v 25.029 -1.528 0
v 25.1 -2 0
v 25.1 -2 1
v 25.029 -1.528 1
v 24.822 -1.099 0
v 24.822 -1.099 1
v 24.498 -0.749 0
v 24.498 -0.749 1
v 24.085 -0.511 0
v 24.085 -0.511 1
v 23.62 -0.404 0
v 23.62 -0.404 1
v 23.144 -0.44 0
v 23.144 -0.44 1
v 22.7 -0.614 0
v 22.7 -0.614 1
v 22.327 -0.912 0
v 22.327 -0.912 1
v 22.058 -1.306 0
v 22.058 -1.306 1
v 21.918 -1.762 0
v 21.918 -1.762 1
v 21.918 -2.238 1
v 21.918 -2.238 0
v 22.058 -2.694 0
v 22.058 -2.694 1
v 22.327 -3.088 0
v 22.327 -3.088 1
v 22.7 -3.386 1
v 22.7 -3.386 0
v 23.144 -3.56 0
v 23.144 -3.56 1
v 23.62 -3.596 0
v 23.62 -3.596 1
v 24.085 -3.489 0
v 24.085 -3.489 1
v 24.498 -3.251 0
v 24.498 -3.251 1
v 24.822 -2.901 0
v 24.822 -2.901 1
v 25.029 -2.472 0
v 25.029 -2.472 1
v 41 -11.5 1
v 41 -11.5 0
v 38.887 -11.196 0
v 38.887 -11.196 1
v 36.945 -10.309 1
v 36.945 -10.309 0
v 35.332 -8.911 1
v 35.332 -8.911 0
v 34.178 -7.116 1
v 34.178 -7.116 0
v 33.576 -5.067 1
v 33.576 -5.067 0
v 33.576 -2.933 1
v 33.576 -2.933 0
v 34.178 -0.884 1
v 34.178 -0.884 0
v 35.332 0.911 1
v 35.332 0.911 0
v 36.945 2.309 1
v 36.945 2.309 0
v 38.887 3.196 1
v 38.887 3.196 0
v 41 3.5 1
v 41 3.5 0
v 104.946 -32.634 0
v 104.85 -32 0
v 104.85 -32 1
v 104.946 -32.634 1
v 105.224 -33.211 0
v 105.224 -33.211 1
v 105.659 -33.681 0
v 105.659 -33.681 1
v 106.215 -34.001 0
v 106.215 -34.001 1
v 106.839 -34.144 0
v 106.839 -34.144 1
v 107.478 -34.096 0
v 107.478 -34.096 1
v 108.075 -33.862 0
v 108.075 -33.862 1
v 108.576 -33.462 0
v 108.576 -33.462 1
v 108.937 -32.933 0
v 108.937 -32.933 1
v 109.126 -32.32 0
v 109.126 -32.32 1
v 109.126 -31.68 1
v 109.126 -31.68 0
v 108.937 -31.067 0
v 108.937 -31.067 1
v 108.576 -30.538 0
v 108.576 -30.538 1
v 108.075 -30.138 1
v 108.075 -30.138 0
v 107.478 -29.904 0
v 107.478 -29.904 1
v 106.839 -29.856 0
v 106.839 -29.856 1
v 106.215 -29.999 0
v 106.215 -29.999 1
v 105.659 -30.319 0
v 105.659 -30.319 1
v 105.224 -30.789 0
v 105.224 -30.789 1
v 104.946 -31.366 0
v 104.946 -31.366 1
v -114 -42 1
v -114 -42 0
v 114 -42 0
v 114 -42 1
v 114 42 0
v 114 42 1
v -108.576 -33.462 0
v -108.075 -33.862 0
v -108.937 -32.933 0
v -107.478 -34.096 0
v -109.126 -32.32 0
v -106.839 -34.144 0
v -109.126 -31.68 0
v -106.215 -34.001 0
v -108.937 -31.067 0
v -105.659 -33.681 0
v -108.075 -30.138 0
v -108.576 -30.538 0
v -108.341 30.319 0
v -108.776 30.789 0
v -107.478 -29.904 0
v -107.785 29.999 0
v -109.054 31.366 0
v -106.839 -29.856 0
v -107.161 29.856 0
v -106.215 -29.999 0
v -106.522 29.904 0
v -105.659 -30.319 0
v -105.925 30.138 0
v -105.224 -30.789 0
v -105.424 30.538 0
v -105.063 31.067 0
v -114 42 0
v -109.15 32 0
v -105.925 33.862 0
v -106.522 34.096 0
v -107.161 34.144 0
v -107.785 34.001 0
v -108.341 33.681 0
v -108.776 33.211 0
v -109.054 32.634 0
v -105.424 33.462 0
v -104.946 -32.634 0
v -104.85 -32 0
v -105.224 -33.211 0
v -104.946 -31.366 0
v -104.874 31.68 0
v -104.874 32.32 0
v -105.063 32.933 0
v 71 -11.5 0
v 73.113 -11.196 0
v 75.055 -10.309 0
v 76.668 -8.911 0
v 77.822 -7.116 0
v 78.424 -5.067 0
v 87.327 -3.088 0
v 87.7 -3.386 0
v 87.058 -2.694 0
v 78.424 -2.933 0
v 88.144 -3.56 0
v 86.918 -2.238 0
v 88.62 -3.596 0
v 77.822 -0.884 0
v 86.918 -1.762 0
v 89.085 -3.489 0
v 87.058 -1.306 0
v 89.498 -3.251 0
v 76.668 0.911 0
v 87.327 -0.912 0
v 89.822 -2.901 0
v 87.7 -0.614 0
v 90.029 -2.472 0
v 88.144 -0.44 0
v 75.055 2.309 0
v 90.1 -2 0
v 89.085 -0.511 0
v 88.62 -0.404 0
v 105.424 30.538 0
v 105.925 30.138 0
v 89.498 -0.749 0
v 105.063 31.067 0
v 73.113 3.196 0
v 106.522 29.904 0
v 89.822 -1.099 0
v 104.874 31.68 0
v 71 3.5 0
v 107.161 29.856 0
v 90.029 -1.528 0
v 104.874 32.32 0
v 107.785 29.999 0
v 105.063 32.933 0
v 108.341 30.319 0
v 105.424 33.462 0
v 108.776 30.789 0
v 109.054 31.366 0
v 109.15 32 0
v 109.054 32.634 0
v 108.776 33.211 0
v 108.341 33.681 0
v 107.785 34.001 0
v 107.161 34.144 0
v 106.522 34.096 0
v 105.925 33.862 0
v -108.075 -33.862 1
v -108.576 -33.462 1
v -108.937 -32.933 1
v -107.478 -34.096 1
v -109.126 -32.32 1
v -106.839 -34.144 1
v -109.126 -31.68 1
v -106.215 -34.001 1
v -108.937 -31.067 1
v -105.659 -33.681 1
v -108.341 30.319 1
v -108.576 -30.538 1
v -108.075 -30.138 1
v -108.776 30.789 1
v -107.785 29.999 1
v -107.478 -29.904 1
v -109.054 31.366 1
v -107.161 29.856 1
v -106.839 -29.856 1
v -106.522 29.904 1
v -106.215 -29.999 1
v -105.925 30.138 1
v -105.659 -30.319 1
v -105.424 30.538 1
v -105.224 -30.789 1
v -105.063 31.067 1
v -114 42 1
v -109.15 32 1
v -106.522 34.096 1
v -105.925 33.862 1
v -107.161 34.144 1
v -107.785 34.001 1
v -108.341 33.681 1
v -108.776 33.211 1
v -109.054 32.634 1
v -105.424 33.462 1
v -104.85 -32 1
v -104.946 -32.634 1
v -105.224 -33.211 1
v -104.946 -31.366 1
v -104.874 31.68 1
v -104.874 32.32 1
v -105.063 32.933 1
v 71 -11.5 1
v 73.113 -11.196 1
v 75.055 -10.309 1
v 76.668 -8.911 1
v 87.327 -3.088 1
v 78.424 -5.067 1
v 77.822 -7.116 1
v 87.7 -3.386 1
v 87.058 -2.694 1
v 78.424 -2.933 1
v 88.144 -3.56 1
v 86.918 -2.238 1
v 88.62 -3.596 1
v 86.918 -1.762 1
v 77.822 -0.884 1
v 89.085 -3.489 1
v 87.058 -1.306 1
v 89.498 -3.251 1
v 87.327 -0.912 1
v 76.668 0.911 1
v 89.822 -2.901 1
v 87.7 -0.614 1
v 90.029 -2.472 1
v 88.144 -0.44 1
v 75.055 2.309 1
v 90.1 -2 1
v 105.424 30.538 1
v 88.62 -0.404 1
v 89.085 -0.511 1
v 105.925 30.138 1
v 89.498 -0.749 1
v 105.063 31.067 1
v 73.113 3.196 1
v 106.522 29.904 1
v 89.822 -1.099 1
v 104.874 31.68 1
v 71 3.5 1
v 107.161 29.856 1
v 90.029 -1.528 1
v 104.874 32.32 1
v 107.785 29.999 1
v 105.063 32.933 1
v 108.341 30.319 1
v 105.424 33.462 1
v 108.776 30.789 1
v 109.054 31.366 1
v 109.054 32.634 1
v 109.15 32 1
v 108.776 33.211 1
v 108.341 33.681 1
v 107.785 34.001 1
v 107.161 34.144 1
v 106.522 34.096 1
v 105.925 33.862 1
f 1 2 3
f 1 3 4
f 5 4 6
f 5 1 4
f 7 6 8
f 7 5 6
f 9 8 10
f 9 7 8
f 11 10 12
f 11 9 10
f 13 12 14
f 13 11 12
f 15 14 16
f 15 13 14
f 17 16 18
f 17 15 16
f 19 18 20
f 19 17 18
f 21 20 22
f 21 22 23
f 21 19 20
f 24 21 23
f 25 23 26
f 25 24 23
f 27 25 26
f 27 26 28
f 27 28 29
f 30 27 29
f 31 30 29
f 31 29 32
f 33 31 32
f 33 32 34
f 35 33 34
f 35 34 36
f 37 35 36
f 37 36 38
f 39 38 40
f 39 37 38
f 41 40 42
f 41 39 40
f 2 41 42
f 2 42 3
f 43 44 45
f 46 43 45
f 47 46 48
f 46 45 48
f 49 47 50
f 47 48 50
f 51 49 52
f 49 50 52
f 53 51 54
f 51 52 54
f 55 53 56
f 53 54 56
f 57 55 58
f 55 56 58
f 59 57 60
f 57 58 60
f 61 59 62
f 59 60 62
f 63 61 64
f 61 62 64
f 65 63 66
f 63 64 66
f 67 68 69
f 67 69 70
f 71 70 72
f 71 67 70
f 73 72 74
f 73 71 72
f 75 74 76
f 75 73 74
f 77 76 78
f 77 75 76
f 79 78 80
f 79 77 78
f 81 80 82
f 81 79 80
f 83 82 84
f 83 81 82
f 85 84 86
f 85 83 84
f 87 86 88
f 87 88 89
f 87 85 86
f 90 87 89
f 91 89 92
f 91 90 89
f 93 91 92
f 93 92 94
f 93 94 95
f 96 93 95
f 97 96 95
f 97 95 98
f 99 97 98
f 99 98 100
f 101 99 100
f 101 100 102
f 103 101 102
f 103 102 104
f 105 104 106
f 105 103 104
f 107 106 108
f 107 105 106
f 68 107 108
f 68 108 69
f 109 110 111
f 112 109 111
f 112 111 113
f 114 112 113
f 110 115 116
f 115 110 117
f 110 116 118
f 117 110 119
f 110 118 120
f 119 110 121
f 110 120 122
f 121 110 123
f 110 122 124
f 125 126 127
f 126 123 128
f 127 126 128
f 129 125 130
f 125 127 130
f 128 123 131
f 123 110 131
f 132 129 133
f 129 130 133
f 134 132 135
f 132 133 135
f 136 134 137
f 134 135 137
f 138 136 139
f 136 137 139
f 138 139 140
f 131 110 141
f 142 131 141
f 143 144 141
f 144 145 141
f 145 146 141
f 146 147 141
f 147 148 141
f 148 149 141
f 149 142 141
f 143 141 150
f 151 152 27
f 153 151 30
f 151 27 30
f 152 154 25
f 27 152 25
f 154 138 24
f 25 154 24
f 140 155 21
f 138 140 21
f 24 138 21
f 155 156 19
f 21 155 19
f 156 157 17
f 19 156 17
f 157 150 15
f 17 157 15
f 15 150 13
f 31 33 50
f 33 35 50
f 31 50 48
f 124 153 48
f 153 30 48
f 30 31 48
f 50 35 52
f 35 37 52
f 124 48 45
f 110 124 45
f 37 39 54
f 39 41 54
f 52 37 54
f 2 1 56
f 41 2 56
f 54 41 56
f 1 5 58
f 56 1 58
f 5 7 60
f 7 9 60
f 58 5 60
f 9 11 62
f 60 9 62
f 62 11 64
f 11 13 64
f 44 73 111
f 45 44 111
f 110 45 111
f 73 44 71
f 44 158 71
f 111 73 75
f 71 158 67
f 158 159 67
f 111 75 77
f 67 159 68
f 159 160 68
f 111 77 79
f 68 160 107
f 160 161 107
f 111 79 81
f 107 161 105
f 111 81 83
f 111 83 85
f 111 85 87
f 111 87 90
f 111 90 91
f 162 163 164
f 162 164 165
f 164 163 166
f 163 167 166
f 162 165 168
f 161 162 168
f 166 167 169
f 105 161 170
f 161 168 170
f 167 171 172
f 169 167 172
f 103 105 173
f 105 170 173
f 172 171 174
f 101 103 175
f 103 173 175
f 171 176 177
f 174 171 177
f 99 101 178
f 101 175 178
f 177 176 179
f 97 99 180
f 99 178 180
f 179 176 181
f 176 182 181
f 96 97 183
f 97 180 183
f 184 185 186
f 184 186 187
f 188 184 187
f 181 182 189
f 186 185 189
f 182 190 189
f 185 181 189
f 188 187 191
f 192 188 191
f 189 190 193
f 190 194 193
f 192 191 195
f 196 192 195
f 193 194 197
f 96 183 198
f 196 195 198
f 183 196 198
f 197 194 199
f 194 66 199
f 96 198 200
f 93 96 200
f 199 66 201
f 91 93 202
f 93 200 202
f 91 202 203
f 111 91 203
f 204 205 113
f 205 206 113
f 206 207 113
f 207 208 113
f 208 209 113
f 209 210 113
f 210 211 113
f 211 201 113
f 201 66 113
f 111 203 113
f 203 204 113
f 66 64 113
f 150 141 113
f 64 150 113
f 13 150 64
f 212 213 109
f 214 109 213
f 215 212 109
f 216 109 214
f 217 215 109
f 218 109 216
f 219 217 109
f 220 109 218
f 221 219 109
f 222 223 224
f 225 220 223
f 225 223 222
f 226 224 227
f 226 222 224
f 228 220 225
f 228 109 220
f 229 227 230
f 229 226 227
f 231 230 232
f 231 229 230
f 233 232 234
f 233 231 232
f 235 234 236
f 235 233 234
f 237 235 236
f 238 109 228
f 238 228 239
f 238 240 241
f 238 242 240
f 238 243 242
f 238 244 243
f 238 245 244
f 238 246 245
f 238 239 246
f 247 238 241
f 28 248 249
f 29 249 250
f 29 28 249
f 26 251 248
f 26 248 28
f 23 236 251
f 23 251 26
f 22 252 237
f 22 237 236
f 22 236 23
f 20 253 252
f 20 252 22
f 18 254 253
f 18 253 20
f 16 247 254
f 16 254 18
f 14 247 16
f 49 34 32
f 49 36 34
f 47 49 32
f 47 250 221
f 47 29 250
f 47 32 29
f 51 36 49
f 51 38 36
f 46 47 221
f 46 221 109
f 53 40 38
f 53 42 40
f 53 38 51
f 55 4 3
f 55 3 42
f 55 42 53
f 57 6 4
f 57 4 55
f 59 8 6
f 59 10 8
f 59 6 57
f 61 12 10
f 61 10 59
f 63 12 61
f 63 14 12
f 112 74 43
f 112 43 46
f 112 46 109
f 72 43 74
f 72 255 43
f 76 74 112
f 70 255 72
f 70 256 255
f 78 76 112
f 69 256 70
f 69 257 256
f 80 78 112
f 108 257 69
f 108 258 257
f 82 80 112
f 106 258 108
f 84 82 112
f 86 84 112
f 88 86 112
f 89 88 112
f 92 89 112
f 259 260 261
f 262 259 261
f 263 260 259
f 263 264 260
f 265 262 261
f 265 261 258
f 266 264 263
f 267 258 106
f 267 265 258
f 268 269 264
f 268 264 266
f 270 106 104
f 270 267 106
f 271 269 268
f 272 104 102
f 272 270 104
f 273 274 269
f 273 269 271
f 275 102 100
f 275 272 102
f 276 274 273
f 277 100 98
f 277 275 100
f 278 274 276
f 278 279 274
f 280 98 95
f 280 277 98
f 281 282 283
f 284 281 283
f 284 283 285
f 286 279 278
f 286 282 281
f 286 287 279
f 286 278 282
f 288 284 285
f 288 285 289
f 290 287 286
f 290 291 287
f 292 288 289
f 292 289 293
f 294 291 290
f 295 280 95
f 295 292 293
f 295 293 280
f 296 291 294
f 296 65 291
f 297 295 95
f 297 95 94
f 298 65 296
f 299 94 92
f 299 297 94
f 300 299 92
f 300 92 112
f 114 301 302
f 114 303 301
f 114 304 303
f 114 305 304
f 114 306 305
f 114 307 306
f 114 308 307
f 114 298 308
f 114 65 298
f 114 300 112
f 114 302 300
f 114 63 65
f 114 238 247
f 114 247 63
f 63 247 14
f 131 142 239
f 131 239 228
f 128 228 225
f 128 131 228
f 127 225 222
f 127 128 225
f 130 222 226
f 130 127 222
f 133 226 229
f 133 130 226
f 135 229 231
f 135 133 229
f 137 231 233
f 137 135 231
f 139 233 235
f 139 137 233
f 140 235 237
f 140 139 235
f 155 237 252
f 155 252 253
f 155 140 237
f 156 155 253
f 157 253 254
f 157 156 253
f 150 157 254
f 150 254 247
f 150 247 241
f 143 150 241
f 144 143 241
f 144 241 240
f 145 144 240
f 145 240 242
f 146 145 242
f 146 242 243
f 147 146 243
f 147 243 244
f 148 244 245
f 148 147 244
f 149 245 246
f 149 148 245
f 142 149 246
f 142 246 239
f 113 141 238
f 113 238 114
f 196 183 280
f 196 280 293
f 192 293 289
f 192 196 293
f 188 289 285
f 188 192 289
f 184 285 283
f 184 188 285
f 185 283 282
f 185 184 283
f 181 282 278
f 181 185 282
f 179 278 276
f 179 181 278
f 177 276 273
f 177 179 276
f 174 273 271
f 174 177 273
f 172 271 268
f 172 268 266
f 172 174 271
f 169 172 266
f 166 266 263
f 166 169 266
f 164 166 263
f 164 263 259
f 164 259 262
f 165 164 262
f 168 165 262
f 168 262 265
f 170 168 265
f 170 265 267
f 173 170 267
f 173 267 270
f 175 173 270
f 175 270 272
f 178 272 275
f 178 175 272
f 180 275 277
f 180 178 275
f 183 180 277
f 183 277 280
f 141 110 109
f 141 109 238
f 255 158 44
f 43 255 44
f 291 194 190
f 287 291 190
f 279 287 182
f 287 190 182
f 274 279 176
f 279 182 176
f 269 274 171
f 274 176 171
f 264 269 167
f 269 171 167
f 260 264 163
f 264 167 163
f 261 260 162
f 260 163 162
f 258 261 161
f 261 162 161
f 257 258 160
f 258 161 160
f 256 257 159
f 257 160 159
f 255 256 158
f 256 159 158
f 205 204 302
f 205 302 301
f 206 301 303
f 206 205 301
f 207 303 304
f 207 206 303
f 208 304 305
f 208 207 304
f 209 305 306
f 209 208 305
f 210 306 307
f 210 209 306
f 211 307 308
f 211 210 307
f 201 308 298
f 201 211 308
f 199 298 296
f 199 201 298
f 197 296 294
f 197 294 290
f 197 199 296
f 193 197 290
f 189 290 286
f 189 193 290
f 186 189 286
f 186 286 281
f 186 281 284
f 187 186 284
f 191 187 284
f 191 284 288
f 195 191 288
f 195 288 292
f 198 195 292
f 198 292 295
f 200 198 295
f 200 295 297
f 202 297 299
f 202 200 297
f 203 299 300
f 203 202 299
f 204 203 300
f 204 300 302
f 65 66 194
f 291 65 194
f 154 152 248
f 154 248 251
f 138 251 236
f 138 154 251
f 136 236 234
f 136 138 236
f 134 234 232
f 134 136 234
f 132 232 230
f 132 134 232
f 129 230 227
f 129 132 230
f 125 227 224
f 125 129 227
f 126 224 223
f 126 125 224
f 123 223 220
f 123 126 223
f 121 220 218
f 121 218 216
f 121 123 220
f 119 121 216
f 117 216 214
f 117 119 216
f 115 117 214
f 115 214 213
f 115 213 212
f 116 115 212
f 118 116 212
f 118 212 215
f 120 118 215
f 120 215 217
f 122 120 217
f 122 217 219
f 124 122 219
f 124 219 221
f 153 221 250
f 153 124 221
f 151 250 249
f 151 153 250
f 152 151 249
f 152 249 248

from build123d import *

# Parameters (mm, degrees)
SKETCH_1_W      = 228
SKETCH_1_H      = 84
SKETCH_1_R      = 1.6
SKETCH_1_R_2    = 2.15
EXTRUDE_1_DEPTH = 1


with BuildPart() as part:
    # Эскиз1 → Вытянуть1 (new body)
    with BuildSketch(Plane.XY):
        Rectangle(SKETCH_1_W, SKETCH_1_H)
        with Locations((23.5, -2)):
            Circle(SKETCH_1_R, mode=Mode.SUBTRACT)
        with Locations((107, 32)):
            Circle(SKETCH_1_R_2, mode=Mode.SUBTRACT)
        with Locations(Location((-107, 32, 0), (0, 0, 180))):
            Circle(SKETCH_1_R_2, mode=Mode.SUBTRACT)
        with Locations((-107, -32)):
            Circle(SKETCH_1_R_2, mode=Mode.SUBTRACT)
        with Locations(Location((107, -32, 0), (0, 0, 180))):
            Circle(SKETCH_1_R_2, mode=Mode.SUBTRACT)
        with Locations((88.5, -2)):
            Circle(SKETCH_1_R, mode=Mode.SUBTRACT)
        with BuildLine():
            Line((41, 3.5), (71, 3.5))
            ThreePointArc((71, 3.5), (78.5, -4), (71, -11.5))
            Line((71, -11.5), (41, -11.5))
            ThreePointArc((41, -11.5), (33.5, -4), (41, 3.5))
        make_face(mode=Mode.SUBTRACT)
    extrude(amount=EXTRUDE_1_DEPTH)


solid = part.part
